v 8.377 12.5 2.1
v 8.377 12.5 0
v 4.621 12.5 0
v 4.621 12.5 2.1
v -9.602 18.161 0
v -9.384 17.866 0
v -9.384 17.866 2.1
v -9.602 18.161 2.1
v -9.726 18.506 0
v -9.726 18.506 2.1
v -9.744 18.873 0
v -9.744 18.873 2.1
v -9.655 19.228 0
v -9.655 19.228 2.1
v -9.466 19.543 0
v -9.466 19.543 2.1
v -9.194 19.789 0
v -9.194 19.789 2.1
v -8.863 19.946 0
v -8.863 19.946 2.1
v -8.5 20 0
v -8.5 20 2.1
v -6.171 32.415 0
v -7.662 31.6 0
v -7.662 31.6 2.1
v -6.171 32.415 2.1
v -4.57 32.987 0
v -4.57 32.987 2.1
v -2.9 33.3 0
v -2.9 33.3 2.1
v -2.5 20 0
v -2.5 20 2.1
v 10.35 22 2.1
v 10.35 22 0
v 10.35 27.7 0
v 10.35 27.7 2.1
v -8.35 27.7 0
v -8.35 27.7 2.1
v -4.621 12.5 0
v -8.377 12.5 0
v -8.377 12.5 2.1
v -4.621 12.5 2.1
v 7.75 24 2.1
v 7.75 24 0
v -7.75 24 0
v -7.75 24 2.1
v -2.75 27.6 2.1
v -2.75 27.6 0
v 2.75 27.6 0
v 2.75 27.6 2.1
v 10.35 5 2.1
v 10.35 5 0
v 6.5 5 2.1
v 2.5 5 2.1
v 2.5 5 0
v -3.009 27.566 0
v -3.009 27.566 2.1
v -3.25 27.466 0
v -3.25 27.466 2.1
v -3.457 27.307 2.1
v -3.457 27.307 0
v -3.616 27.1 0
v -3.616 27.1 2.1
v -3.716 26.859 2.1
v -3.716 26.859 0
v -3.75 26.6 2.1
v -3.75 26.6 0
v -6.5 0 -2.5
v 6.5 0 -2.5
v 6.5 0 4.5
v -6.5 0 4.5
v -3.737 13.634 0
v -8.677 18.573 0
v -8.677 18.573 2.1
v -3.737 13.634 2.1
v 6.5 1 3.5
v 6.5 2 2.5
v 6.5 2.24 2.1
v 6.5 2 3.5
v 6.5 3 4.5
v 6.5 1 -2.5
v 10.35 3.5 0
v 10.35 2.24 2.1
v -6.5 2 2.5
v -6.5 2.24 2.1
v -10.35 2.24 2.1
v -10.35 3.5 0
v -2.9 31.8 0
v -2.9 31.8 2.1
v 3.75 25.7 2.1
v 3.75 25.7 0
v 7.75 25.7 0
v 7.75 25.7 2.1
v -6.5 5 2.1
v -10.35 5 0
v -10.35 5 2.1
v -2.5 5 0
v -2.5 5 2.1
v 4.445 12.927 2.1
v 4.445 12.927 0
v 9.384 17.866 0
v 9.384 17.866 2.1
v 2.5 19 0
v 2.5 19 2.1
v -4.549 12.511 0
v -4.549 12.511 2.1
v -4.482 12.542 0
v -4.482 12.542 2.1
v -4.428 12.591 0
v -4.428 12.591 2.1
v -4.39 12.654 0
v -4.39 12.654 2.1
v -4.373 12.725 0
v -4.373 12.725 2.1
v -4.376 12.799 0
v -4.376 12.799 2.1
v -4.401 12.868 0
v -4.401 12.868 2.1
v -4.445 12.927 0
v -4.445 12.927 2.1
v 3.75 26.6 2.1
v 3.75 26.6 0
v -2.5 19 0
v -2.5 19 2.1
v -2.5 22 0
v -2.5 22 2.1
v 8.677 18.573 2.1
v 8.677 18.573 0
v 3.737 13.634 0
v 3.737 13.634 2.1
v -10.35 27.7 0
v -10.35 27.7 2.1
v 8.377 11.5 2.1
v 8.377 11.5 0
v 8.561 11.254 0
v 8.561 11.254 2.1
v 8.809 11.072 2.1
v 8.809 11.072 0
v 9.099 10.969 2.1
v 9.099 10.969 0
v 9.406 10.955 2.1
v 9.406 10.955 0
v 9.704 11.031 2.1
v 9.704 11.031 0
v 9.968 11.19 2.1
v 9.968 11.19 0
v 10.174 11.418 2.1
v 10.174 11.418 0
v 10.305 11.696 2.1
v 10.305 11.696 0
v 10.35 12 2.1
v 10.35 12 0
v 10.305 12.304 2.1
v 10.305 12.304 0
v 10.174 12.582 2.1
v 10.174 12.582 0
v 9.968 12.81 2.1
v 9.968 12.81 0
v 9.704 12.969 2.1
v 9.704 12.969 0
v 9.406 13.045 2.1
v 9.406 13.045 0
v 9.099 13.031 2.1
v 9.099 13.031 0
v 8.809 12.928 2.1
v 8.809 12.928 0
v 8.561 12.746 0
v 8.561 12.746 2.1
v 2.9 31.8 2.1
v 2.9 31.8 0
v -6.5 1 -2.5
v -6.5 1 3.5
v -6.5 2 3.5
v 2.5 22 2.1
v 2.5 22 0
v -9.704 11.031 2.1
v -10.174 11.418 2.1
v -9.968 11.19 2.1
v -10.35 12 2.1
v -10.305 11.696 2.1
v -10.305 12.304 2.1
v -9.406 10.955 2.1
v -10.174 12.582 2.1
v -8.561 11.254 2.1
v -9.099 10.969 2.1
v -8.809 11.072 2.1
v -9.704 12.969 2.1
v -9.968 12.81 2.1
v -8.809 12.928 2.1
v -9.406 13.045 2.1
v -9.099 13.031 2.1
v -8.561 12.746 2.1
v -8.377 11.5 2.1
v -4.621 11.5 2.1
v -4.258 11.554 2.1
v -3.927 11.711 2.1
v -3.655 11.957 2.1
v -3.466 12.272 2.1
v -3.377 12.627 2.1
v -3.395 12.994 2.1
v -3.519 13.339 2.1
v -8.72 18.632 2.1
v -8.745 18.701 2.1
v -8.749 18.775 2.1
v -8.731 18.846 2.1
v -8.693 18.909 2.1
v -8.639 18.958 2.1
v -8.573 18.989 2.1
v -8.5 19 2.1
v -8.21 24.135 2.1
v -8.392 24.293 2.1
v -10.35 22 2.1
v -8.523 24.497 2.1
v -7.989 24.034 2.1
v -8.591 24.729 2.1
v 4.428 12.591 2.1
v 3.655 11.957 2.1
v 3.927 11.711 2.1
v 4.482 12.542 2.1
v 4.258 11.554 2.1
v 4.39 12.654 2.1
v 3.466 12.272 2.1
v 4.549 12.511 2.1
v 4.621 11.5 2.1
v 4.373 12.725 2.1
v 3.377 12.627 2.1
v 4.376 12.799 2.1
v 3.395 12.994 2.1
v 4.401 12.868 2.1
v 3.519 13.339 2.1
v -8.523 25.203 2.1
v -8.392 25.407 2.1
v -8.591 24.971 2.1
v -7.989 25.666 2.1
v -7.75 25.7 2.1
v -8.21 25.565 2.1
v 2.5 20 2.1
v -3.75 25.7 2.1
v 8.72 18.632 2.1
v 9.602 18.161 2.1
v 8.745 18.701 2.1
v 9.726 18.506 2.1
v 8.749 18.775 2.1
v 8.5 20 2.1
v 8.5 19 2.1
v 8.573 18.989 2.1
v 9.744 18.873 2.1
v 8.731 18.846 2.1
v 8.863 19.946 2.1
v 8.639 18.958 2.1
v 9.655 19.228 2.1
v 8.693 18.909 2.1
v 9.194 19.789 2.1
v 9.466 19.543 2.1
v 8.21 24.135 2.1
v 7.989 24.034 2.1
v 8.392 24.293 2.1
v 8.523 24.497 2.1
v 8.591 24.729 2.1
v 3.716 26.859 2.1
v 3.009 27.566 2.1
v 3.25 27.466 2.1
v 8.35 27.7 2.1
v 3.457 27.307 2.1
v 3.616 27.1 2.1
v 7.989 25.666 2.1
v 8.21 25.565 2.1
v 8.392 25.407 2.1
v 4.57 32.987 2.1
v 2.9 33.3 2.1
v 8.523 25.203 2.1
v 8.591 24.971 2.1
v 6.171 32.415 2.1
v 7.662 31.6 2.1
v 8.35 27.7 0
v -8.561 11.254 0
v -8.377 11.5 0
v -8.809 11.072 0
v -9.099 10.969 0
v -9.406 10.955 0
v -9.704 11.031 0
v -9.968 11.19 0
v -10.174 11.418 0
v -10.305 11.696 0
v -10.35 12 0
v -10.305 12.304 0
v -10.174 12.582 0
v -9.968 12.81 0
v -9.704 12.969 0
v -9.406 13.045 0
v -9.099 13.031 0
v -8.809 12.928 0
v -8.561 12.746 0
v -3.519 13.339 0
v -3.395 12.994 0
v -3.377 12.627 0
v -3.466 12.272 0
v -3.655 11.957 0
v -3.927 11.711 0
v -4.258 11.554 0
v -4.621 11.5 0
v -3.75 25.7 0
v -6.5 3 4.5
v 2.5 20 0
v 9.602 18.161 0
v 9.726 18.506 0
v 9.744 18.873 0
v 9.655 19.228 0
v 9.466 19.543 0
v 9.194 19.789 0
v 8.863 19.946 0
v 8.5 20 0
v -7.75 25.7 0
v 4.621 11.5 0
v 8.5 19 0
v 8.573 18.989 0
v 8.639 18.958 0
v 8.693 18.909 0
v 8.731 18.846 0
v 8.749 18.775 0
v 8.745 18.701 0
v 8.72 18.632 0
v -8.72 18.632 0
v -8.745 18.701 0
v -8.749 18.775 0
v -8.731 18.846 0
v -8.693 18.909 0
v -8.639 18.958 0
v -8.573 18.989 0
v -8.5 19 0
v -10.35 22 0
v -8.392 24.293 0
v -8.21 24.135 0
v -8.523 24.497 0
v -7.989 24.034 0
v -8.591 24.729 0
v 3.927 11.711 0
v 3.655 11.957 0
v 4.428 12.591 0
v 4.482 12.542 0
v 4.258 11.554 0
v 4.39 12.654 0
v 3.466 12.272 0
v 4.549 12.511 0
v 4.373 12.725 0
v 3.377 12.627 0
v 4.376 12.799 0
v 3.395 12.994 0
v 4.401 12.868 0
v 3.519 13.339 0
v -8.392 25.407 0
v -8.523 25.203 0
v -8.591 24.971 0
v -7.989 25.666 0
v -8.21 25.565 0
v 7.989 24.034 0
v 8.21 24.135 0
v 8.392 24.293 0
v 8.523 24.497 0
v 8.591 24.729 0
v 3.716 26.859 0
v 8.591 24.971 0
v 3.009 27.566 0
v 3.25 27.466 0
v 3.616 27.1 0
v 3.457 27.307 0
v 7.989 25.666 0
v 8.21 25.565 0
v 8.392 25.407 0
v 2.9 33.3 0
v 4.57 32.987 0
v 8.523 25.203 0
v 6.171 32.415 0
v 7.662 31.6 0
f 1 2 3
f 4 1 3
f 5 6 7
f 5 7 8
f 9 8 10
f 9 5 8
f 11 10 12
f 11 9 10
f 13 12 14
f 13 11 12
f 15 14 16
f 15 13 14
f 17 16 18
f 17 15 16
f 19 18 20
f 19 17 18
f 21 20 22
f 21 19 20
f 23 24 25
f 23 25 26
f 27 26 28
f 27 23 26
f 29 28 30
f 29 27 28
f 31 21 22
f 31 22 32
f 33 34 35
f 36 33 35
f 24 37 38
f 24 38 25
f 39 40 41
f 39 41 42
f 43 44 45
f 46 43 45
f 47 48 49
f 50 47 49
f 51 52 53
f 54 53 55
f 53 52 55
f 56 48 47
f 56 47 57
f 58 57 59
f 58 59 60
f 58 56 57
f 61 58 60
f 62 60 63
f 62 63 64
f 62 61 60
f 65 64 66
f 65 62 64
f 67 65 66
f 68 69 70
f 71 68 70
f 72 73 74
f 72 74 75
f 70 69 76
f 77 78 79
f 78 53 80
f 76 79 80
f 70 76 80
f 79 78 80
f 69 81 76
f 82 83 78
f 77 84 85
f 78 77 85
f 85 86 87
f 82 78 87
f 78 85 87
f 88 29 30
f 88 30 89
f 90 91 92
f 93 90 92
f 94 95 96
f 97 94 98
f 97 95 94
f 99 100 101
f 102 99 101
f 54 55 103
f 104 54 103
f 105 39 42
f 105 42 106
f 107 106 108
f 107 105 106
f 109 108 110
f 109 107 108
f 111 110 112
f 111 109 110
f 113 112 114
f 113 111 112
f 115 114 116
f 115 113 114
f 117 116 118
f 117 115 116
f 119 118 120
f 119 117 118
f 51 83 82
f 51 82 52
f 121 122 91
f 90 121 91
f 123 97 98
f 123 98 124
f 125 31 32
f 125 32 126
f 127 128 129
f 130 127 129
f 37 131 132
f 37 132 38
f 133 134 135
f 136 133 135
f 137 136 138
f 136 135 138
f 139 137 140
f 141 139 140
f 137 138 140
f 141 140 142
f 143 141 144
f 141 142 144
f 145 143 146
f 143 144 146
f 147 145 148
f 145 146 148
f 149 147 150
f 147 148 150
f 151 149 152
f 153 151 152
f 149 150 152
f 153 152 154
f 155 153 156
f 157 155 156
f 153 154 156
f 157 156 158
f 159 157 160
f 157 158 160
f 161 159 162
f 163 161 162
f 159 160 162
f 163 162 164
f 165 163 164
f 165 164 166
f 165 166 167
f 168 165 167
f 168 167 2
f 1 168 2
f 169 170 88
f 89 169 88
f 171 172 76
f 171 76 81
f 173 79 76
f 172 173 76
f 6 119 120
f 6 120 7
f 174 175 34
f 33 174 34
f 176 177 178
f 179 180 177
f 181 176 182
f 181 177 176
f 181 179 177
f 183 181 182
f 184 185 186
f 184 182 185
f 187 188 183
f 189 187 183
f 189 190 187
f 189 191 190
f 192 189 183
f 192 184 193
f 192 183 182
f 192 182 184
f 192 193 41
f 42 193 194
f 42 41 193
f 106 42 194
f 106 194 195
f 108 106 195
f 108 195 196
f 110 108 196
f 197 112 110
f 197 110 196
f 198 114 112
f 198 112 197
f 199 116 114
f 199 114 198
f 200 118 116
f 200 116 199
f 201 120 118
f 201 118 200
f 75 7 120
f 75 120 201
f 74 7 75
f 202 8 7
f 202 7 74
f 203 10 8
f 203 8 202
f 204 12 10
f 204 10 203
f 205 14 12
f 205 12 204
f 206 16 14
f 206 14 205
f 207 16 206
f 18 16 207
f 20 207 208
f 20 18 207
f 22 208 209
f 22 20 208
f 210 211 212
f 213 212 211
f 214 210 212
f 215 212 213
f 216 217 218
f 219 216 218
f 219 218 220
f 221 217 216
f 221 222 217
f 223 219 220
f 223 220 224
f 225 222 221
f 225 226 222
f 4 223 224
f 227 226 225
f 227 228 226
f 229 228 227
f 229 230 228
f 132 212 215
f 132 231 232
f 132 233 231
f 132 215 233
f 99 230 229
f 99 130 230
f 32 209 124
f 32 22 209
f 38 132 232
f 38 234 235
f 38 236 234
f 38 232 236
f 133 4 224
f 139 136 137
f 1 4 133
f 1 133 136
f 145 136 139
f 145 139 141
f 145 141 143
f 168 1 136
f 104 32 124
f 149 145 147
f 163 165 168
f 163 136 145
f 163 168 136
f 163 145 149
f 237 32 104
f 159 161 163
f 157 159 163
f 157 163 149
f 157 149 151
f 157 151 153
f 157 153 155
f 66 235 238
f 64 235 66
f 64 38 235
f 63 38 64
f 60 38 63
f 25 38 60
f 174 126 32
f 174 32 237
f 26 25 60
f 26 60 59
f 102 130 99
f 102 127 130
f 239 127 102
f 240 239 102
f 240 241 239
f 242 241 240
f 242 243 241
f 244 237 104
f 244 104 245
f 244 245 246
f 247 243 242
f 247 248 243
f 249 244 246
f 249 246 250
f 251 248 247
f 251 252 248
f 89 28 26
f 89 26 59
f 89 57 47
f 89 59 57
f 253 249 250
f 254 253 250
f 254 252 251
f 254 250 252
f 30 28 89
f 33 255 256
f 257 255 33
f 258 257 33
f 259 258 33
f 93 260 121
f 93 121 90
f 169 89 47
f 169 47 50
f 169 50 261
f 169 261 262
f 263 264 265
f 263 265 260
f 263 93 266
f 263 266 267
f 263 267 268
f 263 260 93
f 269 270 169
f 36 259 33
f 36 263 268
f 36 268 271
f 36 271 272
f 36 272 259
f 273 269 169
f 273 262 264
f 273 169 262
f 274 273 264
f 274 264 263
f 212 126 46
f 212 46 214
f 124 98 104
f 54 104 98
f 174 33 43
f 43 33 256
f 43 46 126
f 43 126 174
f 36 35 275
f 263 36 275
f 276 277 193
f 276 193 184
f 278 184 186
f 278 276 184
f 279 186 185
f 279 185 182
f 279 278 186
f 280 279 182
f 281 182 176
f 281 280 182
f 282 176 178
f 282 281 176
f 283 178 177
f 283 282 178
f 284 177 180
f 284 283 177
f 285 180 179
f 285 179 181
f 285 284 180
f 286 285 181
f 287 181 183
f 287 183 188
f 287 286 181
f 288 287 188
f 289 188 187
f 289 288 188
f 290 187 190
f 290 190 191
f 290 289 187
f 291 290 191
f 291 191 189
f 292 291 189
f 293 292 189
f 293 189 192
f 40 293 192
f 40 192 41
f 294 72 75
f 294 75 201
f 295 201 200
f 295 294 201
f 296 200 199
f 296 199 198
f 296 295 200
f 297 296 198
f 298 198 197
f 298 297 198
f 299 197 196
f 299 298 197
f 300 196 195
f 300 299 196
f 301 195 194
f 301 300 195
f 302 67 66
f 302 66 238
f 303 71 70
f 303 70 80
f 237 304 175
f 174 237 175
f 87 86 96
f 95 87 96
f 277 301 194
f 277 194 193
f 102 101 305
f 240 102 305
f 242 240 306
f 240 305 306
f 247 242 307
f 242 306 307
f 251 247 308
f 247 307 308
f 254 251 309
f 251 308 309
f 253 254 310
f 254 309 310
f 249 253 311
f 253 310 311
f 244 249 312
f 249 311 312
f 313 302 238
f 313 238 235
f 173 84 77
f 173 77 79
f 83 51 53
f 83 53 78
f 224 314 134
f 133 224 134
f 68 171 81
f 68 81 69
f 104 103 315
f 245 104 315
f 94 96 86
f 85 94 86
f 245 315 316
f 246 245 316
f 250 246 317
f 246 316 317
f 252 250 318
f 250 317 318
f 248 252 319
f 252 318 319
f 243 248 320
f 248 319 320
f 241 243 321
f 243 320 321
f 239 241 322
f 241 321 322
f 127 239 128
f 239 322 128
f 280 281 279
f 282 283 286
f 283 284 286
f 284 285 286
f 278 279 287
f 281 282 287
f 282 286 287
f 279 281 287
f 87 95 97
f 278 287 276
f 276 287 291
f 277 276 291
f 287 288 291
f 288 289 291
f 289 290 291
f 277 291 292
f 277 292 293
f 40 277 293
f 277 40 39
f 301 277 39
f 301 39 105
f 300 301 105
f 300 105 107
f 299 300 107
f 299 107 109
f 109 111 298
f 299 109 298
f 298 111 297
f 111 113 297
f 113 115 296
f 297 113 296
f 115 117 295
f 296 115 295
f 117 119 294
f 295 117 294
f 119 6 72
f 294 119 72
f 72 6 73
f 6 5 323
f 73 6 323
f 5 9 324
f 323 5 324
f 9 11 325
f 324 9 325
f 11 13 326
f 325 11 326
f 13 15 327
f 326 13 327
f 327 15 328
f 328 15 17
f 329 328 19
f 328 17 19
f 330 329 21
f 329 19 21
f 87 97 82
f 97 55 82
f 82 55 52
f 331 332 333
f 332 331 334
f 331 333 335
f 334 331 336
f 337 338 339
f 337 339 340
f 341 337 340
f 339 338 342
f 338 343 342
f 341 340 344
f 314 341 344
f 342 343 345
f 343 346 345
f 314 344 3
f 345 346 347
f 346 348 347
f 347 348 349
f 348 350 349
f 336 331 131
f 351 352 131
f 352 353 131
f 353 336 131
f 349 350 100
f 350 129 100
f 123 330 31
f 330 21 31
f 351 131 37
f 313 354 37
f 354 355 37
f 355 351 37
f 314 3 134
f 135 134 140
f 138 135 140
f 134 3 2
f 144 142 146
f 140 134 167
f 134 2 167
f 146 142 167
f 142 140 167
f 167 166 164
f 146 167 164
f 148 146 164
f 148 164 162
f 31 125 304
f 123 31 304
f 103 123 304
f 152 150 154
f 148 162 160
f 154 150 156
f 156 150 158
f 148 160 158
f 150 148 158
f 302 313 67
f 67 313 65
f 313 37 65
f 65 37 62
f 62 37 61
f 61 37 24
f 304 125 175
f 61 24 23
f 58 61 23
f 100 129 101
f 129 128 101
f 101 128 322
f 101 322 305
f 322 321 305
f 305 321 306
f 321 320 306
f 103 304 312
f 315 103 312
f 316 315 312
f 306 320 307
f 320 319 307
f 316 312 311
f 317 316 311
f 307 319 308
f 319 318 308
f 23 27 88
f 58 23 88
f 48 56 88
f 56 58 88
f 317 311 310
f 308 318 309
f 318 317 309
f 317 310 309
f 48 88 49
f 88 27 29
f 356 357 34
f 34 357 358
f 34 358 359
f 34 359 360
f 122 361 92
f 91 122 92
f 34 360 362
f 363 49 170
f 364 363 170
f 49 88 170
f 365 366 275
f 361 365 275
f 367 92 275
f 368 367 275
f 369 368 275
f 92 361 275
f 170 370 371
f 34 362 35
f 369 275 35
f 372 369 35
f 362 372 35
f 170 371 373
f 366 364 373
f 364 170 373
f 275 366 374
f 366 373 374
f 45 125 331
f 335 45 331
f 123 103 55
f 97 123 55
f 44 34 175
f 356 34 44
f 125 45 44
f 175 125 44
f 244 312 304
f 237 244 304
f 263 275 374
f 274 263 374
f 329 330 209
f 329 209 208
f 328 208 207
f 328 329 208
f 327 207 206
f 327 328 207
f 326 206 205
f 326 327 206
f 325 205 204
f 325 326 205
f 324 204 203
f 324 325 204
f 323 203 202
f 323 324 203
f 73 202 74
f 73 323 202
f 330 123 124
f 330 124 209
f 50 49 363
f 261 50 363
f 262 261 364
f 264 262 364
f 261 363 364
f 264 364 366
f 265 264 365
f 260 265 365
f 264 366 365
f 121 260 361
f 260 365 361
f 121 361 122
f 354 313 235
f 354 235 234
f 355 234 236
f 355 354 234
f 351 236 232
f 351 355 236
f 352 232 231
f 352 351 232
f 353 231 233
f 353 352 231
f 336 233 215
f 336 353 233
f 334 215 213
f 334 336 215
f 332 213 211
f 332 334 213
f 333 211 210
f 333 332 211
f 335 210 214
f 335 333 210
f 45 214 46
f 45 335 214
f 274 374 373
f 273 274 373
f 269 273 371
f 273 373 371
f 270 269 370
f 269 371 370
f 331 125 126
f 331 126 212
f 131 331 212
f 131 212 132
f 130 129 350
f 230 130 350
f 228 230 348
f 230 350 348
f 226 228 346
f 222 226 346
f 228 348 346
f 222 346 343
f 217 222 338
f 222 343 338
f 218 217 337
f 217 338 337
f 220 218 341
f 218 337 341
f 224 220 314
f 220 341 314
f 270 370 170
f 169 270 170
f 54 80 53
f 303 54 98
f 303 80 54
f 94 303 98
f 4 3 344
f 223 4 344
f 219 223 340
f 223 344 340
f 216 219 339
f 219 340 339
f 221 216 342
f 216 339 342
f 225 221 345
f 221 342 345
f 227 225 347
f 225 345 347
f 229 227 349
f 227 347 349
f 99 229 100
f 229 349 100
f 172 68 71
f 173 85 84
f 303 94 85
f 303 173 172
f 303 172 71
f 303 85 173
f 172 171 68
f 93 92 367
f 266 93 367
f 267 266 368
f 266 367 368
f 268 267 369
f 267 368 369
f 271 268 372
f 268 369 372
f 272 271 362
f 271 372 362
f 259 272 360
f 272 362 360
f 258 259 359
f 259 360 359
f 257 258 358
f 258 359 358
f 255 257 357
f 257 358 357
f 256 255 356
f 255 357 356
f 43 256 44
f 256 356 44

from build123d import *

# Parameters (mm, degrees)
Y_KSEKLIK_EKSTR_ZYON2_DEPTH = 2.1
Y_KSEKLIK_EKSTR_ZYON3_DEPTH = 10.35
KES_EKSTR_ZYON1_DEPTH       = 36.16052474
KES_EKSTR_ZYON2_DEPTH       = 3.85


with BuildPart() as part:
    # Çizim1 → Yükseklik-Ekstrüzyon2 (new body)
    with BuildSketch(Plane.XY):
        with BuildLine():
            Line((0, 0), (-10.35, 0))
            Line((-10.35, 0), (-10.35, 5))
            Line((-10.35, 5), (-2.5, 5))
            Line((-2.5, 5), (-2.5, 19))
            Line((-2.5, 19), (-8.5, 19))
            ThreePointArc((-8.5, 19), (-8.730969883, 18.845670858), (-8.676776695, 18.573223305))
            Line((-8.676776695, 18.573223305), (-3.737436867, 13.633883476))
            ThreePointArc((-3.737436867, 13.633883476), (-3.466470928, 12.27164571), (-4.621320344, 11.5))
            Line((-4.621320344, 11.5), (-8.376690734, 11.5))
            ThreePointArc((-8.376690734, 11.5), (-10.35, 12), (-8.376690734, 12.5))
            Line((-8.376690734, 12.5), (-4.621320344, 12.5))
            ThreePointArc((-4.621320344, 12.5), (-4.39035046, 12.654329142), (-4.444543648, 12.926776695))
            Line((-4.444543648, 12.926776695), (-9.383883476, 17.866116524))
            ThreePointArc((-9.383883476, 17.866116524), (-9.654849416, 19.22835429), (-8.5, 20))
            Line((-8.5, 20), (-2.5, 20))
            Line((-2.5, 20), (-2.5, 22))
            Line((-2.5, 22), (-10.35, 22))
            Line((-10.35, 22), (-10.35, 27.7))
            Line((-10.35, 27.7), (-8.35, 27.7))
            Line((-8.35, 27.7), (-7.662324775, 31.6))
            ThreePointArc((-7.662324775, 31.6), (-5.382058591, 32.732647346), (-2.9, 33.3))
            Line((-2.9, 33.3), (-2.9, 31.8))
            Line((-2.9, 31.8), (0, 31.8))
            Line((0, 31.8), (0, 27.6))
            Line((0, 27.6), (-2.75, 27.6))
            ThreePointArc((-2.75, 27.6), (-3.457106781, 27.307106781), (-3.75, 26.6))
            Line((-3.75, 26.6), (-3.75, 25.7))
            Line((-3.75, 25.7), (-7.75, 25.7))
            ThreePointArc((-7.75, 25.7), (-8.6, 24.85), (-7.75, 24))
            Line((-7.75, 24), (0, 24))
            Line((0, 24), (0, 0))
        make_face()
    extrude(amount=Y_KSEKLIK_EKSTR_ZYON2_DEPTH)

    # Çizim2 → Yükseklik-Ekstrüzyon3 (add, through all)
    with BuildSketch(Plane(origin=(0, 0, 0), x_dir=(0, 0, -1), z_dir=(1, 0, 0))):
        Polygon((0, 5), (0, 3.5), (-2.5, 2), (-3.5, 2), (-3.5, 1), (2.5, 1), (2.5, 0), (-4.5, 0), (-4.5, 3), (-2.1, 5), align=None)
    extrude(amount=-Y_KSEKLIK_EKSTR_ZYON3_DEPTH)

    # Çizim2<3> → Kes-Ekstrüzyon1 (cut, through all)
    with BuildSketch(Plane(origin=(0, 0, 0), x_dir=(0, 0, -1), z_dir=(1, 0, 0))):
        Polygon((0, 3.5), (2.5, 1), (-3.5, 1), (-3.5, 2), (-2.5, 2), align=None)
    extrude(amount=-KES_EKSTR_ZYON1_DEPTH, mode=Mode.SUBTRACT)

    # Çizim3 → Kes-Ekstrüzyon2 (cut)
    with BuildSketch(Plane.ZY.offset(10.35)):
        Polygon((4.5, 3), (2.1, 5), (2.1, 2.24), (2.5, 2), (3.5, 2), (3.5, 1), (-2.5, 1), (-2.5, 0), (4.5, 0), align=None)
    extrude(amount=-KES_EKSTR_ZYON2_DEPTH, mode=Mode.SUBTRACT)

    # Aynalama1: part across plane


with BuildPart() as part_1:
    add(part.part)
    add(part.part.mirror(Plane(origin=(0, 24, 2.1), x_dir=(0, 0, 1), z_dir=(1, 0, 0))))


solid = part_1.part
